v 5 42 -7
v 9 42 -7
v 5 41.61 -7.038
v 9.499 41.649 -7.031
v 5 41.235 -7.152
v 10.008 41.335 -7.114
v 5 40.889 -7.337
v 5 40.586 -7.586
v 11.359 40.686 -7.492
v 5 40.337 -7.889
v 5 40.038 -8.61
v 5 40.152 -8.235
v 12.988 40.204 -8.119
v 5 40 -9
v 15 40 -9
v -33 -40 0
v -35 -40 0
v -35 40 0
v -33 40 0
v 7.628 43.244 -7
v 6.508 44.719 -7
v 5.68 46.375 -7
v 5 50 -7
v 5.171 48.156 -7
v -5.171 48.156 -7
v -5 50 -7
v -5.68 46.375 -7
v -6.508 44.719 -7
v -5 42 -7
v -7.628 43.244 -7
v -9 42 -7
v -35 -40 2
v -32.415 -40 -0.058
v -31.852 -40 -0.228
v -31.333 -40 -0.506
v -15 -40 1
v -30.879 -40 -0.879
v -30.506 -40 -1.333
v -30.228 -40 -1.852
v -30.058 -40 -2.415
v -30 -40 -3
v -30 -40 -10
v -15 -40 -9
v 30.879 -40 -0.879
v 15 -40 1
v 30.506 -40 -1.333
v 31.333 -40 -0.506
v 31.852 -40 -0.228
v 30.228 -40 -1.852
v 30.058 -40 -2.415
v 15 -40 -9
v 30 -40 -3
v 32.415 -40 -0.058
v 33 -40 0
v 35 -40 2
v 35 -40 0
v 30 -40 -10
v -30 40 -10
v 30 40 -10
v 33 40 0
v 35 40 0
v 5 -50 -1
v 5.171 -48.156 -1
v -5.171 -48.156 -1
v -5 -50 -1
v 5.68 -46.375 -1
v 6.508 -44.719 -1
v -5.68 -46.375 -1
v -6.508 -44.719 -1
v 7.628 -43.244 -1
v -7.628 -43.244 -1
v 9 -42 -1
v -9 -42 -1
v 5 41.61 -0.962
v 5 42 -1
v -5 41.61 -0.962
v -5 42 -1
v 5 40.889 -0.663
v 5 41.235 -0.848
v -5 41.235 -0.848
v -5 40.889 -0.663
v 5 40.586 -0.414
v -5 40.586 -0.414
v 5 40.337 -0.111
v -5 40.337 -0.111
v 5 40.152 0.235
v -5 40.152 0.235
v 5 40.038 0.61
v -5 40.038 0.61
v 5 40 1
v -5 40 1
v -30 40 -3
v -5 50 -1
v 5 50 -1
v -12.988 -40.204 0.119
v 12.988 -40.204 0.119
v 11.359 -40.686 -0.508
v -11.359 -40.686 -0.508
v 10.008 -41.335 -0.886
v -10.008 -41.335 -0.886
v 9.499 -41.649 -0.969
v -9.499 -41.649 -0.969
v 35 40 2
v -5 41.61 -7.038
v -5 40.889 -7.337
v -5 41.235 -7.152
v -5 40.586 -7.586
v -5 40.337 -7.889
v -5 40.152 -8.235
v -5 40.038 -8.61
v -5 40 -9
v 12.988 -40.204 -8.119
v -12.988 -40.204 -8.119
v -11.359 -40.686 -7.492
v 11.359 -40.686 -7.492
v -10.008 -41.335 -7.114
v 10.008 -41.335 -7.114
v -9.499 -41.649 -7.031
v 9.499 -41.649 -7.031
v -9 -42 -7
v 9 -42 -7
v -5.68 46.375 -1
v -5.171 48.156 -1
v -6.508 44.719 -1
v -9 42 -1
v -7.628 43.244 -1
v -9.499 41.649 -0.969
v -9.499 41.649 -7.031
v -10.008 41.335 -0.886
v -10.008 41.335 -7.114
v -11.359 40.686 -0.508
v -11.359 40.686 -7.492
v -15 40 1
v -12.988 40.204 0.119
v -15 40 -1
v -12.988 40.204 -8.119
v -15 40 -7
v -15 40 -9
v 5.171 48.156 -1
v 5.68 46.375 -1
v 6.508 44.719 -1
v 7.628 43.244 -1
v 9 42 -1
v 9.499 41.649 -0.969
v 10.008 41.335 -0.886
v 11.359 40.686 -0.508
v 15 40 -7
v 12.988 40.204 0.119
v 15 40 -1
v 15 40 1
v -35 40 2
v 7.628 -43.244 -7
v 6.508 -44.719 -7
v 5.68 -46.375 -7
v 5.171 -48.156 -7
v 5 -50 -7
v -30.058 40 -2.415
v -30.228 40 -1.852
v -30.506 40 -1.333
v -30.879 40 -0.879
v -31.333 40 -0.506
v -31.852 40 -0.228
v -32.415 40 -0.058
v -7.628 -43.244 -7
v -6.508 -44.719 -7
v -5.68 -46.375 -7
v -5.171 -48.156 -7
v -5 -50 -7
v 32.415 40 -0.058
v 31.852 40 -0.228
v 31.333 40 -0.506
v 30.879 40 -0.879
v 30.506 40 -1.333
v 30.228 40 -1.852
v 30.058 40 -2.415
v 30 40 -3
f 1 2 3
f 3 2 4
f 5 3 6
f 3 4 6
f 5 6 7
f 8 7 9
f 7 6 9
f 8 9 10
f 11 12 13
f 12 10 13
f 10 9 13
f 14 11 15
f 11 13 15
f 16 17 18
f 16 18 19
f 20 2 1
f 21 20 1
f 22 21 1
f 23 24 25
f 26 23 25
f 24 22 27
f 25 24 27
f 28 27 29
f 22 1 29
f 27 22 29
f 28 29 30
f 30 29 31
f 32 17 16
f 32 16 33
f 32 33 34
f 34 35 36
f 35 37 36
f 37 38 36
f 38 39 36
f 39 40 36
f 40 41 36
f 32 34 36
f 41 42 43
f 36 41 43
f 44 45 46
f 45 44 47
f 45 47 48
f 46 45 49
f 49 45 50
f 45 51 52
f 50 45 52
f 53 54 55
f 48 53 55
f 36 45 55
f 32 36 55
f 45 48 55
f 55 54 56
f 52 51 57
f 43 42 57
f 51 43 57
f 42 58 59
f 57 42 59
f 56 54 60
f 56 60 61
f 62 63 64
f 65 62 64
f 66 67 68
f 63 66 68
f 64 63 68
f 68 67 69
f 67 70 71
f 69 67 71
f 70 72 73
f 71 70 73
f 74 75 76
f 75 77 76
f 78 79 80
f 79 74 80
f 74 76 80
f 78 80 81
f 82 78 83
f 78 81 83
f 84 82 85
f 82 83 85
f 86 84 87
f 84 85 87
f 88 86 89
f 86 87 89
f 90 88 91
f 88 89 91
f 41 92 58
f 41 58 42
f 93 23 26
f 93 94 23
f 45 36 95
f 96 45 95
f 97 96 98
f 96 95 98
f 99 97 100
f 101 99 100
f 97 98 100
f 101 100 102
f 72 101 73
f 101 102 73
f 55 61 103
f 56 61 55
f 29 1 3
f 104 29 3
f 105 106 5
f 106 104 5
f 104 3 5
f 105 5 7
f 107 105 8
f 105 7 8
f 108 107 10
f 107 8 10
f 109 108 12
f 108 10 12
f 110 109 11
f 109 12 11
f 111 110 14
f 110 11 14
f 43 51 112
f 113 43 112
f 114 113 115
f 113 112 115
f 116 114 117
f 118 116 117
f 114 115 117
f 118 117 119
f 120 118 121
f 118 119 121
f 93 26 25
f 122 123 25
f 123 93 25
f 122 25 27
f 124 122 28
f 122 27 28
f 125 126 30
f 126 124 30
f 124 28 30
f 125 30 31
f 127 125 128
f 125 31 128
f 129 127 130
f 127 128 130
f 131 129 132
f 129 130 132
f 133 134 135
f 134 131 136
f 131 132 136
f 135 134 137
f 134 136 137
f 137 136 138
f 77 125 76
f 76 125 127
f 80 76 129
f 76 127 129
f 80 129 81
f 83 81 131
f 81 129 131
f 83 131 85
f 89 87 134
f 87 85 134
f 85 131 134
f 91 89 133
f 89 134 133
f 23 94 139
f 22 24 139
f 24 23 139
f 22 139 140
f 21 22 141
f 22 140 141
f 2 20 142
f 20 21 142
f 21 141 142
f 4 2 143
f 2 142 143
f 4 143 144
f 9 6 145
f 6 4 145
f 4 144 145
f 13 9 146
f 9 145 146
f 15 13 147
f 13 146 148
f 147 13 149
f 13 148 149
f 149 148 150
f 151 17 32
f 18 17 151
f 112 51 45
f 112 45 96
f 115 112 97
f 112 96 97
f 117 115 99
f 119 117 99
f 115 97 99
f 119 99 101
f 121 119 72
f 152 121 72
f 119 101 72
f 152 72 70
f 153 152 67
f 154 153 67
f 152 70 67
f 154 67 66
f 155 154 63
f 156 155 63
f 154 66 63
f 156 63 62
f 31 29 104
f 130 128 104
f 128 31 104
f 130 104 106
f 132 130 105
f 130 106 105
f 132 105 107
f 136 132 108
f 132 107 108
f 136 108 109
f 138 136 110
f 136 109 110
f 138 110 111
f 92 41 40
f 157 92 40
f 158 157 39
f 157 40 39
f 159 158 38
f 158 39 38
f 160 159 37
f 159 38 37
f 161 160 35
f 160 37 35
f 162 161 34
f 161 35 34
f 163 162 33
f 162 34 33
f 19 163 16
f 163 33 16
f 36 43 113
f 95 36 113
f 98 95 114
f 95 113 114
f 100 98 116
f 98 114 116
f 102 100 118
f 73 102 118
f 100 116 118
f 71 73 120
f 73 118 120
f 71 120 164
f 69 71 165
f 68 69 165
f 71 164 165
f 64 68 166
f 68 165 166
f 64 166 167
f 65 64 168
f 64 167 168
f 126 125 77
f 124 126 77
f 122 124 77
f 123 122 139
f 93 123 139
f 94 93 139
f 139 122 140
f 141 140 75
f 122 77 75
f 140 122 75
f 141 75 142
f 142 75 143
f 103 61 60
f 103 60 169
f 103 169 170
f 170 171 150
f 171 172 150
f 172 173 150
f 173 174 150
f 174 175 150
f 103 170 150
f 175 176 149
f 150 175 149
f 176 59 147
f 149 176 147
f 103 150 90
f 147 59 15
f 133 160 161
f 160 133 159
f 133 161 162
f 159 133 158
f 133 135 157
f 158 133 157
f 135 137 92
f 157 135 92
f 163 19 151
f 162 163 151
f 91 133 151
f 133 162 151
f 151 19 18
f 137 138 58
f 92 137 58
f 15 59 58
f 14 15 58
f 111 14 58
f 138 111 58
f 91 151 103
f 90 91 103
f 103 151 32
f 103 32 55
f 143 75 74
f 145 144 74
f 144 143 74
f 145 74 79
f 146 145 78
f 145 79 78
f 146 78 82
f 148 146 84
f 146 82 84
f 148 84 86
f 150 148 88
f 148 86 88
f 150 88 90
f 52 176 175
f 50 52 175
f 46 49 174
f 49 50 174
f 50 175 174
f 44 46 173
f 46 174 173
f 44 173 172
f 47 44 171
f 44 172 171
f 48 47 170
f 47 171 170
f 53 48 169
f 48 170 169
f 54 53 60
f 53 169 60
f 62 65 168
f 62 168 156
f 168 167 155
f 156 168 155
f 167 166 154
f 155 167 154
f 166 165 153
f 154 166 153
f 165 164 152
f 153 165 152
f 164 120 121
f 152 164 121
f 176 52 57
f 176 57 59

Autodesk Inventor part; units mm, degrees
ref_plane "YZ Plane" through (0, 0, 0) normal (1, 0, 0) x (0, 1, 0)
ref_plane "XZ Plane" through (0, 0, 0) normal (0, 1, 0) x (-1, 0, 0)
ref_plane "XY Plane" through (0, 0, 0) normal (0, 0, 1) x (1, 0, 0)
sketch "Esboço1" plane through (0, 0, 0) normal (0, 0, 1) x (1, 0, 0)
  line L0 (-30, -40) -> (30, -40)
  line L1 (30, -40) -> (30, 40)
  line L2 (30, 40) -> (-30, 40)
  line L3 (-30, 40) -> (-30, -40)
  line L4 (-30, -40) -> (30, 40) construction
  line L5 (30, -40) -> (-30, 40) construction
  line L6 (35, 40) -> (35, -40)
  line L7 (-35, -40) -> (-35, 40)
  line L8 (30, -40) -> (35, -40)
  line L9 (-35, -40) -> (-30, -40)
  line L10 (-35, 40) -> (-30, 40)
  line L11 (30, 40) -> (35, 40)
  point P0 (0, 0)
  dimension "d0" = 60
  dimension "d1" = 80
  dimension "d2" = 5
  dimension "d3" = 5
extrude "Extrusão1" add sketch "Esboço1" along normal blind 2
extrude "Extrusão2" add sketch "Esboço1" against normal blind 10 contours L3 L2 L1 L0
fillet "Arredondamento1" radius 3 2 edges at (30, 0, 0) (-30, 0, 0)
sketch "Esboço2" plane through (-35, -40, 2) normal (0, -1, 0) x (1, 0, 0)
  line L0 (65, -12) -> (5, -12) projected
  line L1 (65, -12) -> (65, 0)
  line L2 (0, 0) -> (70, 0) projected
  line L3 (65, -6) -> (5, -6) construction
  line L4 (5, -5) -> (5, -12) projected
  line L5 (40, -3) -> (30, -3)
  line L6 (30, -3) -> (30, -9)
  line L7 (30, -9) -> (40, -9)
  line L8 (40, -9) -> (40, -3)
  line L9 (40, -3) -> (30, -9) construction
  line L10 (30, -3) -> (40, -9) construction
  point P0 (35, -2)
  point P1 (35, -6)
  dimension "d9" = 10
  dimension "d10" = 6
extrude "Extrusão3" add sketch "Esboço2" along normal blind 10
fillet "Arredondamento2" radius 10 2 edges at (5, -40, -4) (-5, -40, -4)
fillet "Arredondamento3" radius 2 2 edges at (0, -40, -7) (0, -40, -1)
mirror "Espelhar1" about plane through (0, 0, 0) normal (0, 1, 0) of "Arredondamento2", "Extrusão3", "Arredondamento3"
properties part number "Repetidor"
